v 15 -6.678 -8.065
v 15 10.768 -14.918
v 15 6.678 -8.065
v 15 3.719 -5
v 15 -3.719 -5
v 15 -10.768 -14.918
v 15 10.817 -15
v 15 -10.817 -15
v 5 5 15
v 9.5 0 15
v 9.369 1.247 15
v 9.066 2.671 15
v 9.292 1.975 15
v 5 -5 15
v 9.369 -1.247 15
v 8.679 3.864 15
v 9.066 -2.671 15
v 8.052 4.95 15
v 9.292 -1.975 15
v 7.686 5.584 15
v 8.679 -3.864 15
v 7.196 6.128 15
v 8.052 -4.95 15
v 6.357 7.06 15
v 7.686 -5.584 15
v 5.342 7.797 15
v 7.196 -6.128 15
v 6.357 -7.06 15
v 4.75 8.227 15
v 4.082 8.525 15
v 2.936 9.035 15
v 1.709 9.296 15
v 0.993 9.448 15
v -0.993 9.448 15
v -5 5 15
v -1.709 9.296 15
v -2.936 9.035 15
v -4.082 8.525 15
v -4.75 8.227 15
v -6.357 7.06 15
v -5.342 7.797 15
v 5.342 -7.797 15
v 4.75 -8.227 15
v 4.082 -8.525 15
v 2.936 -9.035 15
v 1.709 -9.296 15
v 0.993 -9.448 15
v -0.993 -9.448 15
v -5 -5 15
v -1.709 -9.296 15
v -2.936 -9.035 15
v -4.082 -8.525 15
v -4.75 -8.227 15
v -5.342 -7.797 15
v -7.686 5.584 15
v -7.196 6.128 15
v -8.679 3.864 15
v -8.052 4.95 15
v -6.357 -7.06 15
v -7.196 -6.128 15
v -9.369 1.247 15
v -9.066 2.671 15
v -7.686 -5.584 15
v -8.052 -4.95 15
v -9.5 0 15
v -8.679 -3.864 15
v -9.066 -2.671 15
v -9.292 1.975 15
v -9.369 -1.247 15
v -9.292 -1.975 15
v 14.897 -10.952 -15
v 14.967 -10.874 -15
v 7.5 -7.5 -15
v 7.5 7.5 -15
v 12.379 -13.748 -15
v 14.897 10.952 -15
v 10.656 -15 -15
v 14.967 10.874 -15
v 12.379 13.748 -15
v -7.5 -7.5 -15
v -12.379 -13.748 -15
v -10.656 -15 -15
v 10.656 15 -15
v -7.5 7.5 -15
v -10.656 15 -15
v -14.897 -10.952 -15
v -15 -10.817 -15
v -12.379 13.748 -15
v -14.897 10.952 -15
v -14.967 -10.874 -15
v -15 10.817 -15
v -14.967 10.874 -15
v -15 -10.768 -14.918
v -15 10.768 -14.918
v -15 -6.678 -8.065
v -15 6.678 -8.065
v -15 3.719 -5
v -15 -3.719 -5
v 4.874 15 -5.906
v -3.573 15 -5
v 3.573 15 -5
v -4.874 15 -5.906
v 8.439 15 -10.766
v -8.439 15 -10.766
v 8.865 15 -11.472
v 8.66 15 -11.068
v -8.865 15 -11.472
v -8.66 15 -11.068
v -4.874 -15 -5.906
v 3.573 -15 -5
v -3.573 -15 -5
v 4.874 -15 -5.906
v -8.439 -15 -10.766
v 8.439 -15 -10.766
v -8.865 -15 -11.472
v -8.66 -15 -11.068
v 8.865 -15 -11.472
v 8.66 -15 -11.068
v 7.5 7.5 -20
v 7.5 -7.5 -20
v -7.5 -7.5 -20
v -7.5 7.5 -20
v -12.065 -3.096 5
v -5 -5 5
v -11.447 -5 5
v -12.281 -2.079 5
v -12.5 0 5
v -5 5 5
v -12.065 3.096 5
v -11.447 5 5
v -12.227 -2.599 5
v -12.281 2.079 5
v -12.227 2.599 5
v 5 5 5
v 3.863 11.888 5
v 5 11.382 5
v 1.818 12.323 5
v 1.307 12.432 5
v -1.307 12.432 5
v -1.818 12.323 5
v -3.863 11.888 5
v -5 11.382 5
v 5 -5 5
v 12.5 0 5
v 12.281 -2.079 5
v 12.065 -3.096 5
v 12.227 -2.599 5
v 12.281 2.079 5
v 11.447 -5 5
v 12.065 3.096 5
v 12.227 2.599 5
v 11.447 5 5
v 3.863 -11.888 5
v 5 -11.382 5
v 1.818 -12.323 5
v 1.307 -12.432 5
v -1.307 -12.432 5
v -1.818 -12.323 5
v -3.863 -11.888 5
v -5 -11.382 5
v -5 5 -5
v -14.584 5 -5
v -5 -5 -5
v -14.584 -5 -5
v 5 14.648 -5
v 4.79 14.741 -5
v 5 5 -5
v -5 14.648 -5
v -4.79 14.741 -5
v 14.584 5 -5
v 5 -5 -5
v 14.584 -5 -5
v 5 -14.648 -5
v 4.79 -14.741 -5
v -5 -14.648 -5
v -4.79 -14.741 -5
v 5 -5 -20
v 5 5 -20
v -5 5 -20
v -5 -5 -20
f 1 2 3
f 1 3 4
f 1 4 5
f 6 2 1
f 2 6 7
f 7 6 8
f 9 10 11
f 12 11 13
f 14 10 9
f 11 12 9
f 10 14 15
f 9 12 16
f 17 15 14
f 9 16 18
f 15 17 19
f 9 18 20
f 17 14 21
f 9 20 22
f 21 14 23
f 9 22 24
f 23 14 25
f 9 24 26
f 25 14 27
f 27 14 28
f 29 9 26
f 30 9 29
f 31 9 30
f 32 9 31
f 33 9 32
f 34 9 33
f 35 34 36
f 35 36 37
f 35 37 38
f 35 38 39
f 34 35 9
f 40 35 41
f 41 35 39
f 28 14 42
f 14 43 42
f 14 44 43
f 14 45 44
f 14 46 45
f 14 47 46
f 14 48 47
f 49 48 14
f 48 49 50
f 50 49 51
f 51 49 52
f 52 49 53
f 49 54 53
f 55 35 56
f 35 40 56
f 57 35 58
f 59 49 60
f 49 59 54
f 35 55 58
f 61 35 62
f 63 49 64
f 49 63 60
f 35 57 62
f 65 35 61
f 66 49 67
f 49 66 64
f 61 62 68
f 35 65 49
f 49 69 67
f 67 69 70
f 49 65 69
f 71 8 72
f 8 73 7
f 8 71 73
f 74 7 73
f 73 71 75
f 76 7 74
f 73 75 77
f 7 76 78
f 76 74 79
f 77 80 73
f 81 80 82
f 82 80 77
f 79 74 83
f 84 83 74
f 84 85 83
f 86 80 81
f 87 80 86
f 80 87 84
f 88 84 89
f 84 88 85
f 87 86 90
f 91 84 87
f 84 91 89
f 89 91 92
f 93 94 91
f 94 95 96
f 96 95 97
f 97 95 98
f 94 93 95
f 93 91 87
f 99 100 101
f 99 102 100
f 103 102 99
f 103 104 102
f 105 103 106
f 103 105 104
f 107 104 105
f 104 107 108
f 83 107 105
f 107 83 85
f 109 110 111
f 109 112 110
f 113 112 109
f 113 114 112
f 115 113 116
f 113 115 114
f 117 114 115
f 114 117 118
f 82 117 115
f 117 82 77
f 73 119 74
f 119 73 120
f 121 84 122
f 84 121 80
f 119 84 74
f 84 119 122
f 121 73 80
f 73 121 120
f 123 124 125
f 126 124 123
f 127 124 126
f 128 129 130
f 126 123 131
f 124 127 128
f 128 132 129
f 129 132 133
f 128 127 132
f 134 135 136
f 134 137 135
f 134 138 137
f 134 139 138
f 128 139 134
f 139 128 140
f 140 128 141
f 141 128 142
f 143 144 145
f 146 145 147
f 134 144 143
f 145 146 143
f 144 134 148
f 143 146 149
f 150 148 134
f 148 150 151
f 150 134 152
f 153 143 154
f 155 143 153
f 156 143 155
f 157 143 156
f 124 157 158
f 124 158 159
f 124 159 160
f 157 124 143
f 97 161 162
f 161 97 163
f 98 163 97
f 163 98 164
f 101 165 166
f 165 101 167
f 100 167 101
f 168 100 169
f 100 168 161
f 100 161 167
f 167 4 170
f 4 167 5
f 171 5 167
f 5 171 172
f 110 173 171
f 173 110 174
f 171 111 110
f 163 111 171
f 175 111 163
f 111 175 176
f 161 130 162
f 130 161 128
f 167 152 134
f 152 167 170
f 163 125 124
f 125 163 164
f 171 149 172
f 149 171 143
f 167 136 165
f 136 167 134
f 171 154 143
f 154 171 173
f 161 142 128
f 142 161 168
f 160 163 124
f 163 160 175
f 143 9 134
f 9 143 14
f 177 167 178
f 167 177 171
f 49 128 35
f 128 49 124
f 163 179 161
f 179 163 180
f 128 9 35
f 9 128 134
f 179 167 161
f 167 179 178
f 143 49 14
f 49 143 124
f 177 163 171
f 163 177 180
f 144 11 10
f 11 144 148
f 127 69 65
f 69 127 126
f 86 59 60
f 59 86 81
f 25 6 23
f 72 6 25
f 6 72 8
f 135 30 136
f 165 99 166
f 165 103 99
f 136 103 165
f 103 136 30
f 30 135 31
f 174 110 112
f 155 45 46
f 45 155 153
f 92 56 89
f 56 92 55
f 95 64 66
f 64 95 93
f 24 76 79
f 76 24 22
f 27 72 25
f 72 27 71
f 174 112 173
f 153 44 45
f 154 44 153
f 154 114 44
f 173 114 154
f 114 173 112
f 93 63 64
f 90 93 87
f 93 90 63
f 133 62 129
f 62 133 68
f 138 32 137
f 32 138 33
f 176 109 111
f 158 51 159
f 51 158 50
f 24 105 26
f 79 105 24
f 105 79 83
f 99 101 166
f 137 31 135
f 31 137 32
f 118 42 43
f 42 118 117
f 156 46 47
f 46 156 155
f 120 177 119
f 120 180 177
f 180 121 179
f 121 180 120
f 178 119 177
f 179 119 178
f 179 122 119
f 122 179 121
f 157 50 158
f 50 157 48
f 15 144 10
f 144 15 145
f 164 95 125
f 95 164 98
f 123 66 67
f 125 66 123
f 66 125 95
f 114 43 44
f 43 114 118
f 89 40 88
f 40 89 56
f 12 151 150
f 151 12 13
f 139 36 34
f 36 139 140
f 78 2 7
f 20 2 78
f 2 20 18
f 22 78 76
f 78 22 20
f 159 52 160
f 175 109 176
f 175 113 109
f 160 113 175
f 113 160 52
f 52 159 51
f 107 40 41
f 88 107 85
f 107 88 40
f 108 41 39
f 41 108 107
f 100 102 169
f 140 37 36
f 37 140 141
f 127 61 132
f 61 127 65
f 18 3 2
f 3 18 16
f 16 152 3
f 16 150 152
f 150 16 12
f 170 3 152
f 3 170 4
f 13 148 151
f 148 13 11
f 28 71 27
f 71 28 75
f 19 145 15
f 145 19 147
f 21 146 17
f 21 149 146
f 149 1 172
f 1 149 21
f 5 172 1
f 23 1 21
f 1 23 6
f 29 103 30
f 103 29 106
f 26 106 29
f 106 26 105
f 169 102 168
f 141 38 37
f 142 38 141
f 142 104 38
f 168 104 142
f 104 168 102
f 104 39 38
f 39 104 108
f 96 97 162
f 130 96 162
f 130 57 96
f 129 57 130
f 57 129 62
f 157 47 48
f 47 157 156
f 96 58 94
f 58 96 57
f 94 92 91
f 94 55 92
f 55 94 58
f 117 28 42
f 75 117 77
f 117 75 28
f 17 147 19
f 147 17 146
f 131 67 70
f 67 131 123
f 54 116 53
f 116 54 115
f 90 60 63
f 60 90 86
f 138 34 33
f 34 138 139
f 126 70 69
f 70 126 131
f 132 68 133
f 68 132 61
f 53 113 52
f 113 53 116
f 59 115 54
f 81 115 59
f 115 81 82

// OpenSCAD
module example002()
{
	intersection() {
		difference() {
			union() {
				cube(size=[30, 30, 30], center = true);
				translate([0, 0, -25])
					cube(size=[15, 15, 50], center = true);
			}
			union() {
				cube(size=[50, 10, 10], center = true);
				cube(size=[10, 50, 10], center = true);
				cube(size=[10, 10, 50], center = true);
			}
		}
		translate([0, 0, 5])
			cylinder(h = 50, r1 = 20, r2 = 5, center = true);
	}
}

example002();
